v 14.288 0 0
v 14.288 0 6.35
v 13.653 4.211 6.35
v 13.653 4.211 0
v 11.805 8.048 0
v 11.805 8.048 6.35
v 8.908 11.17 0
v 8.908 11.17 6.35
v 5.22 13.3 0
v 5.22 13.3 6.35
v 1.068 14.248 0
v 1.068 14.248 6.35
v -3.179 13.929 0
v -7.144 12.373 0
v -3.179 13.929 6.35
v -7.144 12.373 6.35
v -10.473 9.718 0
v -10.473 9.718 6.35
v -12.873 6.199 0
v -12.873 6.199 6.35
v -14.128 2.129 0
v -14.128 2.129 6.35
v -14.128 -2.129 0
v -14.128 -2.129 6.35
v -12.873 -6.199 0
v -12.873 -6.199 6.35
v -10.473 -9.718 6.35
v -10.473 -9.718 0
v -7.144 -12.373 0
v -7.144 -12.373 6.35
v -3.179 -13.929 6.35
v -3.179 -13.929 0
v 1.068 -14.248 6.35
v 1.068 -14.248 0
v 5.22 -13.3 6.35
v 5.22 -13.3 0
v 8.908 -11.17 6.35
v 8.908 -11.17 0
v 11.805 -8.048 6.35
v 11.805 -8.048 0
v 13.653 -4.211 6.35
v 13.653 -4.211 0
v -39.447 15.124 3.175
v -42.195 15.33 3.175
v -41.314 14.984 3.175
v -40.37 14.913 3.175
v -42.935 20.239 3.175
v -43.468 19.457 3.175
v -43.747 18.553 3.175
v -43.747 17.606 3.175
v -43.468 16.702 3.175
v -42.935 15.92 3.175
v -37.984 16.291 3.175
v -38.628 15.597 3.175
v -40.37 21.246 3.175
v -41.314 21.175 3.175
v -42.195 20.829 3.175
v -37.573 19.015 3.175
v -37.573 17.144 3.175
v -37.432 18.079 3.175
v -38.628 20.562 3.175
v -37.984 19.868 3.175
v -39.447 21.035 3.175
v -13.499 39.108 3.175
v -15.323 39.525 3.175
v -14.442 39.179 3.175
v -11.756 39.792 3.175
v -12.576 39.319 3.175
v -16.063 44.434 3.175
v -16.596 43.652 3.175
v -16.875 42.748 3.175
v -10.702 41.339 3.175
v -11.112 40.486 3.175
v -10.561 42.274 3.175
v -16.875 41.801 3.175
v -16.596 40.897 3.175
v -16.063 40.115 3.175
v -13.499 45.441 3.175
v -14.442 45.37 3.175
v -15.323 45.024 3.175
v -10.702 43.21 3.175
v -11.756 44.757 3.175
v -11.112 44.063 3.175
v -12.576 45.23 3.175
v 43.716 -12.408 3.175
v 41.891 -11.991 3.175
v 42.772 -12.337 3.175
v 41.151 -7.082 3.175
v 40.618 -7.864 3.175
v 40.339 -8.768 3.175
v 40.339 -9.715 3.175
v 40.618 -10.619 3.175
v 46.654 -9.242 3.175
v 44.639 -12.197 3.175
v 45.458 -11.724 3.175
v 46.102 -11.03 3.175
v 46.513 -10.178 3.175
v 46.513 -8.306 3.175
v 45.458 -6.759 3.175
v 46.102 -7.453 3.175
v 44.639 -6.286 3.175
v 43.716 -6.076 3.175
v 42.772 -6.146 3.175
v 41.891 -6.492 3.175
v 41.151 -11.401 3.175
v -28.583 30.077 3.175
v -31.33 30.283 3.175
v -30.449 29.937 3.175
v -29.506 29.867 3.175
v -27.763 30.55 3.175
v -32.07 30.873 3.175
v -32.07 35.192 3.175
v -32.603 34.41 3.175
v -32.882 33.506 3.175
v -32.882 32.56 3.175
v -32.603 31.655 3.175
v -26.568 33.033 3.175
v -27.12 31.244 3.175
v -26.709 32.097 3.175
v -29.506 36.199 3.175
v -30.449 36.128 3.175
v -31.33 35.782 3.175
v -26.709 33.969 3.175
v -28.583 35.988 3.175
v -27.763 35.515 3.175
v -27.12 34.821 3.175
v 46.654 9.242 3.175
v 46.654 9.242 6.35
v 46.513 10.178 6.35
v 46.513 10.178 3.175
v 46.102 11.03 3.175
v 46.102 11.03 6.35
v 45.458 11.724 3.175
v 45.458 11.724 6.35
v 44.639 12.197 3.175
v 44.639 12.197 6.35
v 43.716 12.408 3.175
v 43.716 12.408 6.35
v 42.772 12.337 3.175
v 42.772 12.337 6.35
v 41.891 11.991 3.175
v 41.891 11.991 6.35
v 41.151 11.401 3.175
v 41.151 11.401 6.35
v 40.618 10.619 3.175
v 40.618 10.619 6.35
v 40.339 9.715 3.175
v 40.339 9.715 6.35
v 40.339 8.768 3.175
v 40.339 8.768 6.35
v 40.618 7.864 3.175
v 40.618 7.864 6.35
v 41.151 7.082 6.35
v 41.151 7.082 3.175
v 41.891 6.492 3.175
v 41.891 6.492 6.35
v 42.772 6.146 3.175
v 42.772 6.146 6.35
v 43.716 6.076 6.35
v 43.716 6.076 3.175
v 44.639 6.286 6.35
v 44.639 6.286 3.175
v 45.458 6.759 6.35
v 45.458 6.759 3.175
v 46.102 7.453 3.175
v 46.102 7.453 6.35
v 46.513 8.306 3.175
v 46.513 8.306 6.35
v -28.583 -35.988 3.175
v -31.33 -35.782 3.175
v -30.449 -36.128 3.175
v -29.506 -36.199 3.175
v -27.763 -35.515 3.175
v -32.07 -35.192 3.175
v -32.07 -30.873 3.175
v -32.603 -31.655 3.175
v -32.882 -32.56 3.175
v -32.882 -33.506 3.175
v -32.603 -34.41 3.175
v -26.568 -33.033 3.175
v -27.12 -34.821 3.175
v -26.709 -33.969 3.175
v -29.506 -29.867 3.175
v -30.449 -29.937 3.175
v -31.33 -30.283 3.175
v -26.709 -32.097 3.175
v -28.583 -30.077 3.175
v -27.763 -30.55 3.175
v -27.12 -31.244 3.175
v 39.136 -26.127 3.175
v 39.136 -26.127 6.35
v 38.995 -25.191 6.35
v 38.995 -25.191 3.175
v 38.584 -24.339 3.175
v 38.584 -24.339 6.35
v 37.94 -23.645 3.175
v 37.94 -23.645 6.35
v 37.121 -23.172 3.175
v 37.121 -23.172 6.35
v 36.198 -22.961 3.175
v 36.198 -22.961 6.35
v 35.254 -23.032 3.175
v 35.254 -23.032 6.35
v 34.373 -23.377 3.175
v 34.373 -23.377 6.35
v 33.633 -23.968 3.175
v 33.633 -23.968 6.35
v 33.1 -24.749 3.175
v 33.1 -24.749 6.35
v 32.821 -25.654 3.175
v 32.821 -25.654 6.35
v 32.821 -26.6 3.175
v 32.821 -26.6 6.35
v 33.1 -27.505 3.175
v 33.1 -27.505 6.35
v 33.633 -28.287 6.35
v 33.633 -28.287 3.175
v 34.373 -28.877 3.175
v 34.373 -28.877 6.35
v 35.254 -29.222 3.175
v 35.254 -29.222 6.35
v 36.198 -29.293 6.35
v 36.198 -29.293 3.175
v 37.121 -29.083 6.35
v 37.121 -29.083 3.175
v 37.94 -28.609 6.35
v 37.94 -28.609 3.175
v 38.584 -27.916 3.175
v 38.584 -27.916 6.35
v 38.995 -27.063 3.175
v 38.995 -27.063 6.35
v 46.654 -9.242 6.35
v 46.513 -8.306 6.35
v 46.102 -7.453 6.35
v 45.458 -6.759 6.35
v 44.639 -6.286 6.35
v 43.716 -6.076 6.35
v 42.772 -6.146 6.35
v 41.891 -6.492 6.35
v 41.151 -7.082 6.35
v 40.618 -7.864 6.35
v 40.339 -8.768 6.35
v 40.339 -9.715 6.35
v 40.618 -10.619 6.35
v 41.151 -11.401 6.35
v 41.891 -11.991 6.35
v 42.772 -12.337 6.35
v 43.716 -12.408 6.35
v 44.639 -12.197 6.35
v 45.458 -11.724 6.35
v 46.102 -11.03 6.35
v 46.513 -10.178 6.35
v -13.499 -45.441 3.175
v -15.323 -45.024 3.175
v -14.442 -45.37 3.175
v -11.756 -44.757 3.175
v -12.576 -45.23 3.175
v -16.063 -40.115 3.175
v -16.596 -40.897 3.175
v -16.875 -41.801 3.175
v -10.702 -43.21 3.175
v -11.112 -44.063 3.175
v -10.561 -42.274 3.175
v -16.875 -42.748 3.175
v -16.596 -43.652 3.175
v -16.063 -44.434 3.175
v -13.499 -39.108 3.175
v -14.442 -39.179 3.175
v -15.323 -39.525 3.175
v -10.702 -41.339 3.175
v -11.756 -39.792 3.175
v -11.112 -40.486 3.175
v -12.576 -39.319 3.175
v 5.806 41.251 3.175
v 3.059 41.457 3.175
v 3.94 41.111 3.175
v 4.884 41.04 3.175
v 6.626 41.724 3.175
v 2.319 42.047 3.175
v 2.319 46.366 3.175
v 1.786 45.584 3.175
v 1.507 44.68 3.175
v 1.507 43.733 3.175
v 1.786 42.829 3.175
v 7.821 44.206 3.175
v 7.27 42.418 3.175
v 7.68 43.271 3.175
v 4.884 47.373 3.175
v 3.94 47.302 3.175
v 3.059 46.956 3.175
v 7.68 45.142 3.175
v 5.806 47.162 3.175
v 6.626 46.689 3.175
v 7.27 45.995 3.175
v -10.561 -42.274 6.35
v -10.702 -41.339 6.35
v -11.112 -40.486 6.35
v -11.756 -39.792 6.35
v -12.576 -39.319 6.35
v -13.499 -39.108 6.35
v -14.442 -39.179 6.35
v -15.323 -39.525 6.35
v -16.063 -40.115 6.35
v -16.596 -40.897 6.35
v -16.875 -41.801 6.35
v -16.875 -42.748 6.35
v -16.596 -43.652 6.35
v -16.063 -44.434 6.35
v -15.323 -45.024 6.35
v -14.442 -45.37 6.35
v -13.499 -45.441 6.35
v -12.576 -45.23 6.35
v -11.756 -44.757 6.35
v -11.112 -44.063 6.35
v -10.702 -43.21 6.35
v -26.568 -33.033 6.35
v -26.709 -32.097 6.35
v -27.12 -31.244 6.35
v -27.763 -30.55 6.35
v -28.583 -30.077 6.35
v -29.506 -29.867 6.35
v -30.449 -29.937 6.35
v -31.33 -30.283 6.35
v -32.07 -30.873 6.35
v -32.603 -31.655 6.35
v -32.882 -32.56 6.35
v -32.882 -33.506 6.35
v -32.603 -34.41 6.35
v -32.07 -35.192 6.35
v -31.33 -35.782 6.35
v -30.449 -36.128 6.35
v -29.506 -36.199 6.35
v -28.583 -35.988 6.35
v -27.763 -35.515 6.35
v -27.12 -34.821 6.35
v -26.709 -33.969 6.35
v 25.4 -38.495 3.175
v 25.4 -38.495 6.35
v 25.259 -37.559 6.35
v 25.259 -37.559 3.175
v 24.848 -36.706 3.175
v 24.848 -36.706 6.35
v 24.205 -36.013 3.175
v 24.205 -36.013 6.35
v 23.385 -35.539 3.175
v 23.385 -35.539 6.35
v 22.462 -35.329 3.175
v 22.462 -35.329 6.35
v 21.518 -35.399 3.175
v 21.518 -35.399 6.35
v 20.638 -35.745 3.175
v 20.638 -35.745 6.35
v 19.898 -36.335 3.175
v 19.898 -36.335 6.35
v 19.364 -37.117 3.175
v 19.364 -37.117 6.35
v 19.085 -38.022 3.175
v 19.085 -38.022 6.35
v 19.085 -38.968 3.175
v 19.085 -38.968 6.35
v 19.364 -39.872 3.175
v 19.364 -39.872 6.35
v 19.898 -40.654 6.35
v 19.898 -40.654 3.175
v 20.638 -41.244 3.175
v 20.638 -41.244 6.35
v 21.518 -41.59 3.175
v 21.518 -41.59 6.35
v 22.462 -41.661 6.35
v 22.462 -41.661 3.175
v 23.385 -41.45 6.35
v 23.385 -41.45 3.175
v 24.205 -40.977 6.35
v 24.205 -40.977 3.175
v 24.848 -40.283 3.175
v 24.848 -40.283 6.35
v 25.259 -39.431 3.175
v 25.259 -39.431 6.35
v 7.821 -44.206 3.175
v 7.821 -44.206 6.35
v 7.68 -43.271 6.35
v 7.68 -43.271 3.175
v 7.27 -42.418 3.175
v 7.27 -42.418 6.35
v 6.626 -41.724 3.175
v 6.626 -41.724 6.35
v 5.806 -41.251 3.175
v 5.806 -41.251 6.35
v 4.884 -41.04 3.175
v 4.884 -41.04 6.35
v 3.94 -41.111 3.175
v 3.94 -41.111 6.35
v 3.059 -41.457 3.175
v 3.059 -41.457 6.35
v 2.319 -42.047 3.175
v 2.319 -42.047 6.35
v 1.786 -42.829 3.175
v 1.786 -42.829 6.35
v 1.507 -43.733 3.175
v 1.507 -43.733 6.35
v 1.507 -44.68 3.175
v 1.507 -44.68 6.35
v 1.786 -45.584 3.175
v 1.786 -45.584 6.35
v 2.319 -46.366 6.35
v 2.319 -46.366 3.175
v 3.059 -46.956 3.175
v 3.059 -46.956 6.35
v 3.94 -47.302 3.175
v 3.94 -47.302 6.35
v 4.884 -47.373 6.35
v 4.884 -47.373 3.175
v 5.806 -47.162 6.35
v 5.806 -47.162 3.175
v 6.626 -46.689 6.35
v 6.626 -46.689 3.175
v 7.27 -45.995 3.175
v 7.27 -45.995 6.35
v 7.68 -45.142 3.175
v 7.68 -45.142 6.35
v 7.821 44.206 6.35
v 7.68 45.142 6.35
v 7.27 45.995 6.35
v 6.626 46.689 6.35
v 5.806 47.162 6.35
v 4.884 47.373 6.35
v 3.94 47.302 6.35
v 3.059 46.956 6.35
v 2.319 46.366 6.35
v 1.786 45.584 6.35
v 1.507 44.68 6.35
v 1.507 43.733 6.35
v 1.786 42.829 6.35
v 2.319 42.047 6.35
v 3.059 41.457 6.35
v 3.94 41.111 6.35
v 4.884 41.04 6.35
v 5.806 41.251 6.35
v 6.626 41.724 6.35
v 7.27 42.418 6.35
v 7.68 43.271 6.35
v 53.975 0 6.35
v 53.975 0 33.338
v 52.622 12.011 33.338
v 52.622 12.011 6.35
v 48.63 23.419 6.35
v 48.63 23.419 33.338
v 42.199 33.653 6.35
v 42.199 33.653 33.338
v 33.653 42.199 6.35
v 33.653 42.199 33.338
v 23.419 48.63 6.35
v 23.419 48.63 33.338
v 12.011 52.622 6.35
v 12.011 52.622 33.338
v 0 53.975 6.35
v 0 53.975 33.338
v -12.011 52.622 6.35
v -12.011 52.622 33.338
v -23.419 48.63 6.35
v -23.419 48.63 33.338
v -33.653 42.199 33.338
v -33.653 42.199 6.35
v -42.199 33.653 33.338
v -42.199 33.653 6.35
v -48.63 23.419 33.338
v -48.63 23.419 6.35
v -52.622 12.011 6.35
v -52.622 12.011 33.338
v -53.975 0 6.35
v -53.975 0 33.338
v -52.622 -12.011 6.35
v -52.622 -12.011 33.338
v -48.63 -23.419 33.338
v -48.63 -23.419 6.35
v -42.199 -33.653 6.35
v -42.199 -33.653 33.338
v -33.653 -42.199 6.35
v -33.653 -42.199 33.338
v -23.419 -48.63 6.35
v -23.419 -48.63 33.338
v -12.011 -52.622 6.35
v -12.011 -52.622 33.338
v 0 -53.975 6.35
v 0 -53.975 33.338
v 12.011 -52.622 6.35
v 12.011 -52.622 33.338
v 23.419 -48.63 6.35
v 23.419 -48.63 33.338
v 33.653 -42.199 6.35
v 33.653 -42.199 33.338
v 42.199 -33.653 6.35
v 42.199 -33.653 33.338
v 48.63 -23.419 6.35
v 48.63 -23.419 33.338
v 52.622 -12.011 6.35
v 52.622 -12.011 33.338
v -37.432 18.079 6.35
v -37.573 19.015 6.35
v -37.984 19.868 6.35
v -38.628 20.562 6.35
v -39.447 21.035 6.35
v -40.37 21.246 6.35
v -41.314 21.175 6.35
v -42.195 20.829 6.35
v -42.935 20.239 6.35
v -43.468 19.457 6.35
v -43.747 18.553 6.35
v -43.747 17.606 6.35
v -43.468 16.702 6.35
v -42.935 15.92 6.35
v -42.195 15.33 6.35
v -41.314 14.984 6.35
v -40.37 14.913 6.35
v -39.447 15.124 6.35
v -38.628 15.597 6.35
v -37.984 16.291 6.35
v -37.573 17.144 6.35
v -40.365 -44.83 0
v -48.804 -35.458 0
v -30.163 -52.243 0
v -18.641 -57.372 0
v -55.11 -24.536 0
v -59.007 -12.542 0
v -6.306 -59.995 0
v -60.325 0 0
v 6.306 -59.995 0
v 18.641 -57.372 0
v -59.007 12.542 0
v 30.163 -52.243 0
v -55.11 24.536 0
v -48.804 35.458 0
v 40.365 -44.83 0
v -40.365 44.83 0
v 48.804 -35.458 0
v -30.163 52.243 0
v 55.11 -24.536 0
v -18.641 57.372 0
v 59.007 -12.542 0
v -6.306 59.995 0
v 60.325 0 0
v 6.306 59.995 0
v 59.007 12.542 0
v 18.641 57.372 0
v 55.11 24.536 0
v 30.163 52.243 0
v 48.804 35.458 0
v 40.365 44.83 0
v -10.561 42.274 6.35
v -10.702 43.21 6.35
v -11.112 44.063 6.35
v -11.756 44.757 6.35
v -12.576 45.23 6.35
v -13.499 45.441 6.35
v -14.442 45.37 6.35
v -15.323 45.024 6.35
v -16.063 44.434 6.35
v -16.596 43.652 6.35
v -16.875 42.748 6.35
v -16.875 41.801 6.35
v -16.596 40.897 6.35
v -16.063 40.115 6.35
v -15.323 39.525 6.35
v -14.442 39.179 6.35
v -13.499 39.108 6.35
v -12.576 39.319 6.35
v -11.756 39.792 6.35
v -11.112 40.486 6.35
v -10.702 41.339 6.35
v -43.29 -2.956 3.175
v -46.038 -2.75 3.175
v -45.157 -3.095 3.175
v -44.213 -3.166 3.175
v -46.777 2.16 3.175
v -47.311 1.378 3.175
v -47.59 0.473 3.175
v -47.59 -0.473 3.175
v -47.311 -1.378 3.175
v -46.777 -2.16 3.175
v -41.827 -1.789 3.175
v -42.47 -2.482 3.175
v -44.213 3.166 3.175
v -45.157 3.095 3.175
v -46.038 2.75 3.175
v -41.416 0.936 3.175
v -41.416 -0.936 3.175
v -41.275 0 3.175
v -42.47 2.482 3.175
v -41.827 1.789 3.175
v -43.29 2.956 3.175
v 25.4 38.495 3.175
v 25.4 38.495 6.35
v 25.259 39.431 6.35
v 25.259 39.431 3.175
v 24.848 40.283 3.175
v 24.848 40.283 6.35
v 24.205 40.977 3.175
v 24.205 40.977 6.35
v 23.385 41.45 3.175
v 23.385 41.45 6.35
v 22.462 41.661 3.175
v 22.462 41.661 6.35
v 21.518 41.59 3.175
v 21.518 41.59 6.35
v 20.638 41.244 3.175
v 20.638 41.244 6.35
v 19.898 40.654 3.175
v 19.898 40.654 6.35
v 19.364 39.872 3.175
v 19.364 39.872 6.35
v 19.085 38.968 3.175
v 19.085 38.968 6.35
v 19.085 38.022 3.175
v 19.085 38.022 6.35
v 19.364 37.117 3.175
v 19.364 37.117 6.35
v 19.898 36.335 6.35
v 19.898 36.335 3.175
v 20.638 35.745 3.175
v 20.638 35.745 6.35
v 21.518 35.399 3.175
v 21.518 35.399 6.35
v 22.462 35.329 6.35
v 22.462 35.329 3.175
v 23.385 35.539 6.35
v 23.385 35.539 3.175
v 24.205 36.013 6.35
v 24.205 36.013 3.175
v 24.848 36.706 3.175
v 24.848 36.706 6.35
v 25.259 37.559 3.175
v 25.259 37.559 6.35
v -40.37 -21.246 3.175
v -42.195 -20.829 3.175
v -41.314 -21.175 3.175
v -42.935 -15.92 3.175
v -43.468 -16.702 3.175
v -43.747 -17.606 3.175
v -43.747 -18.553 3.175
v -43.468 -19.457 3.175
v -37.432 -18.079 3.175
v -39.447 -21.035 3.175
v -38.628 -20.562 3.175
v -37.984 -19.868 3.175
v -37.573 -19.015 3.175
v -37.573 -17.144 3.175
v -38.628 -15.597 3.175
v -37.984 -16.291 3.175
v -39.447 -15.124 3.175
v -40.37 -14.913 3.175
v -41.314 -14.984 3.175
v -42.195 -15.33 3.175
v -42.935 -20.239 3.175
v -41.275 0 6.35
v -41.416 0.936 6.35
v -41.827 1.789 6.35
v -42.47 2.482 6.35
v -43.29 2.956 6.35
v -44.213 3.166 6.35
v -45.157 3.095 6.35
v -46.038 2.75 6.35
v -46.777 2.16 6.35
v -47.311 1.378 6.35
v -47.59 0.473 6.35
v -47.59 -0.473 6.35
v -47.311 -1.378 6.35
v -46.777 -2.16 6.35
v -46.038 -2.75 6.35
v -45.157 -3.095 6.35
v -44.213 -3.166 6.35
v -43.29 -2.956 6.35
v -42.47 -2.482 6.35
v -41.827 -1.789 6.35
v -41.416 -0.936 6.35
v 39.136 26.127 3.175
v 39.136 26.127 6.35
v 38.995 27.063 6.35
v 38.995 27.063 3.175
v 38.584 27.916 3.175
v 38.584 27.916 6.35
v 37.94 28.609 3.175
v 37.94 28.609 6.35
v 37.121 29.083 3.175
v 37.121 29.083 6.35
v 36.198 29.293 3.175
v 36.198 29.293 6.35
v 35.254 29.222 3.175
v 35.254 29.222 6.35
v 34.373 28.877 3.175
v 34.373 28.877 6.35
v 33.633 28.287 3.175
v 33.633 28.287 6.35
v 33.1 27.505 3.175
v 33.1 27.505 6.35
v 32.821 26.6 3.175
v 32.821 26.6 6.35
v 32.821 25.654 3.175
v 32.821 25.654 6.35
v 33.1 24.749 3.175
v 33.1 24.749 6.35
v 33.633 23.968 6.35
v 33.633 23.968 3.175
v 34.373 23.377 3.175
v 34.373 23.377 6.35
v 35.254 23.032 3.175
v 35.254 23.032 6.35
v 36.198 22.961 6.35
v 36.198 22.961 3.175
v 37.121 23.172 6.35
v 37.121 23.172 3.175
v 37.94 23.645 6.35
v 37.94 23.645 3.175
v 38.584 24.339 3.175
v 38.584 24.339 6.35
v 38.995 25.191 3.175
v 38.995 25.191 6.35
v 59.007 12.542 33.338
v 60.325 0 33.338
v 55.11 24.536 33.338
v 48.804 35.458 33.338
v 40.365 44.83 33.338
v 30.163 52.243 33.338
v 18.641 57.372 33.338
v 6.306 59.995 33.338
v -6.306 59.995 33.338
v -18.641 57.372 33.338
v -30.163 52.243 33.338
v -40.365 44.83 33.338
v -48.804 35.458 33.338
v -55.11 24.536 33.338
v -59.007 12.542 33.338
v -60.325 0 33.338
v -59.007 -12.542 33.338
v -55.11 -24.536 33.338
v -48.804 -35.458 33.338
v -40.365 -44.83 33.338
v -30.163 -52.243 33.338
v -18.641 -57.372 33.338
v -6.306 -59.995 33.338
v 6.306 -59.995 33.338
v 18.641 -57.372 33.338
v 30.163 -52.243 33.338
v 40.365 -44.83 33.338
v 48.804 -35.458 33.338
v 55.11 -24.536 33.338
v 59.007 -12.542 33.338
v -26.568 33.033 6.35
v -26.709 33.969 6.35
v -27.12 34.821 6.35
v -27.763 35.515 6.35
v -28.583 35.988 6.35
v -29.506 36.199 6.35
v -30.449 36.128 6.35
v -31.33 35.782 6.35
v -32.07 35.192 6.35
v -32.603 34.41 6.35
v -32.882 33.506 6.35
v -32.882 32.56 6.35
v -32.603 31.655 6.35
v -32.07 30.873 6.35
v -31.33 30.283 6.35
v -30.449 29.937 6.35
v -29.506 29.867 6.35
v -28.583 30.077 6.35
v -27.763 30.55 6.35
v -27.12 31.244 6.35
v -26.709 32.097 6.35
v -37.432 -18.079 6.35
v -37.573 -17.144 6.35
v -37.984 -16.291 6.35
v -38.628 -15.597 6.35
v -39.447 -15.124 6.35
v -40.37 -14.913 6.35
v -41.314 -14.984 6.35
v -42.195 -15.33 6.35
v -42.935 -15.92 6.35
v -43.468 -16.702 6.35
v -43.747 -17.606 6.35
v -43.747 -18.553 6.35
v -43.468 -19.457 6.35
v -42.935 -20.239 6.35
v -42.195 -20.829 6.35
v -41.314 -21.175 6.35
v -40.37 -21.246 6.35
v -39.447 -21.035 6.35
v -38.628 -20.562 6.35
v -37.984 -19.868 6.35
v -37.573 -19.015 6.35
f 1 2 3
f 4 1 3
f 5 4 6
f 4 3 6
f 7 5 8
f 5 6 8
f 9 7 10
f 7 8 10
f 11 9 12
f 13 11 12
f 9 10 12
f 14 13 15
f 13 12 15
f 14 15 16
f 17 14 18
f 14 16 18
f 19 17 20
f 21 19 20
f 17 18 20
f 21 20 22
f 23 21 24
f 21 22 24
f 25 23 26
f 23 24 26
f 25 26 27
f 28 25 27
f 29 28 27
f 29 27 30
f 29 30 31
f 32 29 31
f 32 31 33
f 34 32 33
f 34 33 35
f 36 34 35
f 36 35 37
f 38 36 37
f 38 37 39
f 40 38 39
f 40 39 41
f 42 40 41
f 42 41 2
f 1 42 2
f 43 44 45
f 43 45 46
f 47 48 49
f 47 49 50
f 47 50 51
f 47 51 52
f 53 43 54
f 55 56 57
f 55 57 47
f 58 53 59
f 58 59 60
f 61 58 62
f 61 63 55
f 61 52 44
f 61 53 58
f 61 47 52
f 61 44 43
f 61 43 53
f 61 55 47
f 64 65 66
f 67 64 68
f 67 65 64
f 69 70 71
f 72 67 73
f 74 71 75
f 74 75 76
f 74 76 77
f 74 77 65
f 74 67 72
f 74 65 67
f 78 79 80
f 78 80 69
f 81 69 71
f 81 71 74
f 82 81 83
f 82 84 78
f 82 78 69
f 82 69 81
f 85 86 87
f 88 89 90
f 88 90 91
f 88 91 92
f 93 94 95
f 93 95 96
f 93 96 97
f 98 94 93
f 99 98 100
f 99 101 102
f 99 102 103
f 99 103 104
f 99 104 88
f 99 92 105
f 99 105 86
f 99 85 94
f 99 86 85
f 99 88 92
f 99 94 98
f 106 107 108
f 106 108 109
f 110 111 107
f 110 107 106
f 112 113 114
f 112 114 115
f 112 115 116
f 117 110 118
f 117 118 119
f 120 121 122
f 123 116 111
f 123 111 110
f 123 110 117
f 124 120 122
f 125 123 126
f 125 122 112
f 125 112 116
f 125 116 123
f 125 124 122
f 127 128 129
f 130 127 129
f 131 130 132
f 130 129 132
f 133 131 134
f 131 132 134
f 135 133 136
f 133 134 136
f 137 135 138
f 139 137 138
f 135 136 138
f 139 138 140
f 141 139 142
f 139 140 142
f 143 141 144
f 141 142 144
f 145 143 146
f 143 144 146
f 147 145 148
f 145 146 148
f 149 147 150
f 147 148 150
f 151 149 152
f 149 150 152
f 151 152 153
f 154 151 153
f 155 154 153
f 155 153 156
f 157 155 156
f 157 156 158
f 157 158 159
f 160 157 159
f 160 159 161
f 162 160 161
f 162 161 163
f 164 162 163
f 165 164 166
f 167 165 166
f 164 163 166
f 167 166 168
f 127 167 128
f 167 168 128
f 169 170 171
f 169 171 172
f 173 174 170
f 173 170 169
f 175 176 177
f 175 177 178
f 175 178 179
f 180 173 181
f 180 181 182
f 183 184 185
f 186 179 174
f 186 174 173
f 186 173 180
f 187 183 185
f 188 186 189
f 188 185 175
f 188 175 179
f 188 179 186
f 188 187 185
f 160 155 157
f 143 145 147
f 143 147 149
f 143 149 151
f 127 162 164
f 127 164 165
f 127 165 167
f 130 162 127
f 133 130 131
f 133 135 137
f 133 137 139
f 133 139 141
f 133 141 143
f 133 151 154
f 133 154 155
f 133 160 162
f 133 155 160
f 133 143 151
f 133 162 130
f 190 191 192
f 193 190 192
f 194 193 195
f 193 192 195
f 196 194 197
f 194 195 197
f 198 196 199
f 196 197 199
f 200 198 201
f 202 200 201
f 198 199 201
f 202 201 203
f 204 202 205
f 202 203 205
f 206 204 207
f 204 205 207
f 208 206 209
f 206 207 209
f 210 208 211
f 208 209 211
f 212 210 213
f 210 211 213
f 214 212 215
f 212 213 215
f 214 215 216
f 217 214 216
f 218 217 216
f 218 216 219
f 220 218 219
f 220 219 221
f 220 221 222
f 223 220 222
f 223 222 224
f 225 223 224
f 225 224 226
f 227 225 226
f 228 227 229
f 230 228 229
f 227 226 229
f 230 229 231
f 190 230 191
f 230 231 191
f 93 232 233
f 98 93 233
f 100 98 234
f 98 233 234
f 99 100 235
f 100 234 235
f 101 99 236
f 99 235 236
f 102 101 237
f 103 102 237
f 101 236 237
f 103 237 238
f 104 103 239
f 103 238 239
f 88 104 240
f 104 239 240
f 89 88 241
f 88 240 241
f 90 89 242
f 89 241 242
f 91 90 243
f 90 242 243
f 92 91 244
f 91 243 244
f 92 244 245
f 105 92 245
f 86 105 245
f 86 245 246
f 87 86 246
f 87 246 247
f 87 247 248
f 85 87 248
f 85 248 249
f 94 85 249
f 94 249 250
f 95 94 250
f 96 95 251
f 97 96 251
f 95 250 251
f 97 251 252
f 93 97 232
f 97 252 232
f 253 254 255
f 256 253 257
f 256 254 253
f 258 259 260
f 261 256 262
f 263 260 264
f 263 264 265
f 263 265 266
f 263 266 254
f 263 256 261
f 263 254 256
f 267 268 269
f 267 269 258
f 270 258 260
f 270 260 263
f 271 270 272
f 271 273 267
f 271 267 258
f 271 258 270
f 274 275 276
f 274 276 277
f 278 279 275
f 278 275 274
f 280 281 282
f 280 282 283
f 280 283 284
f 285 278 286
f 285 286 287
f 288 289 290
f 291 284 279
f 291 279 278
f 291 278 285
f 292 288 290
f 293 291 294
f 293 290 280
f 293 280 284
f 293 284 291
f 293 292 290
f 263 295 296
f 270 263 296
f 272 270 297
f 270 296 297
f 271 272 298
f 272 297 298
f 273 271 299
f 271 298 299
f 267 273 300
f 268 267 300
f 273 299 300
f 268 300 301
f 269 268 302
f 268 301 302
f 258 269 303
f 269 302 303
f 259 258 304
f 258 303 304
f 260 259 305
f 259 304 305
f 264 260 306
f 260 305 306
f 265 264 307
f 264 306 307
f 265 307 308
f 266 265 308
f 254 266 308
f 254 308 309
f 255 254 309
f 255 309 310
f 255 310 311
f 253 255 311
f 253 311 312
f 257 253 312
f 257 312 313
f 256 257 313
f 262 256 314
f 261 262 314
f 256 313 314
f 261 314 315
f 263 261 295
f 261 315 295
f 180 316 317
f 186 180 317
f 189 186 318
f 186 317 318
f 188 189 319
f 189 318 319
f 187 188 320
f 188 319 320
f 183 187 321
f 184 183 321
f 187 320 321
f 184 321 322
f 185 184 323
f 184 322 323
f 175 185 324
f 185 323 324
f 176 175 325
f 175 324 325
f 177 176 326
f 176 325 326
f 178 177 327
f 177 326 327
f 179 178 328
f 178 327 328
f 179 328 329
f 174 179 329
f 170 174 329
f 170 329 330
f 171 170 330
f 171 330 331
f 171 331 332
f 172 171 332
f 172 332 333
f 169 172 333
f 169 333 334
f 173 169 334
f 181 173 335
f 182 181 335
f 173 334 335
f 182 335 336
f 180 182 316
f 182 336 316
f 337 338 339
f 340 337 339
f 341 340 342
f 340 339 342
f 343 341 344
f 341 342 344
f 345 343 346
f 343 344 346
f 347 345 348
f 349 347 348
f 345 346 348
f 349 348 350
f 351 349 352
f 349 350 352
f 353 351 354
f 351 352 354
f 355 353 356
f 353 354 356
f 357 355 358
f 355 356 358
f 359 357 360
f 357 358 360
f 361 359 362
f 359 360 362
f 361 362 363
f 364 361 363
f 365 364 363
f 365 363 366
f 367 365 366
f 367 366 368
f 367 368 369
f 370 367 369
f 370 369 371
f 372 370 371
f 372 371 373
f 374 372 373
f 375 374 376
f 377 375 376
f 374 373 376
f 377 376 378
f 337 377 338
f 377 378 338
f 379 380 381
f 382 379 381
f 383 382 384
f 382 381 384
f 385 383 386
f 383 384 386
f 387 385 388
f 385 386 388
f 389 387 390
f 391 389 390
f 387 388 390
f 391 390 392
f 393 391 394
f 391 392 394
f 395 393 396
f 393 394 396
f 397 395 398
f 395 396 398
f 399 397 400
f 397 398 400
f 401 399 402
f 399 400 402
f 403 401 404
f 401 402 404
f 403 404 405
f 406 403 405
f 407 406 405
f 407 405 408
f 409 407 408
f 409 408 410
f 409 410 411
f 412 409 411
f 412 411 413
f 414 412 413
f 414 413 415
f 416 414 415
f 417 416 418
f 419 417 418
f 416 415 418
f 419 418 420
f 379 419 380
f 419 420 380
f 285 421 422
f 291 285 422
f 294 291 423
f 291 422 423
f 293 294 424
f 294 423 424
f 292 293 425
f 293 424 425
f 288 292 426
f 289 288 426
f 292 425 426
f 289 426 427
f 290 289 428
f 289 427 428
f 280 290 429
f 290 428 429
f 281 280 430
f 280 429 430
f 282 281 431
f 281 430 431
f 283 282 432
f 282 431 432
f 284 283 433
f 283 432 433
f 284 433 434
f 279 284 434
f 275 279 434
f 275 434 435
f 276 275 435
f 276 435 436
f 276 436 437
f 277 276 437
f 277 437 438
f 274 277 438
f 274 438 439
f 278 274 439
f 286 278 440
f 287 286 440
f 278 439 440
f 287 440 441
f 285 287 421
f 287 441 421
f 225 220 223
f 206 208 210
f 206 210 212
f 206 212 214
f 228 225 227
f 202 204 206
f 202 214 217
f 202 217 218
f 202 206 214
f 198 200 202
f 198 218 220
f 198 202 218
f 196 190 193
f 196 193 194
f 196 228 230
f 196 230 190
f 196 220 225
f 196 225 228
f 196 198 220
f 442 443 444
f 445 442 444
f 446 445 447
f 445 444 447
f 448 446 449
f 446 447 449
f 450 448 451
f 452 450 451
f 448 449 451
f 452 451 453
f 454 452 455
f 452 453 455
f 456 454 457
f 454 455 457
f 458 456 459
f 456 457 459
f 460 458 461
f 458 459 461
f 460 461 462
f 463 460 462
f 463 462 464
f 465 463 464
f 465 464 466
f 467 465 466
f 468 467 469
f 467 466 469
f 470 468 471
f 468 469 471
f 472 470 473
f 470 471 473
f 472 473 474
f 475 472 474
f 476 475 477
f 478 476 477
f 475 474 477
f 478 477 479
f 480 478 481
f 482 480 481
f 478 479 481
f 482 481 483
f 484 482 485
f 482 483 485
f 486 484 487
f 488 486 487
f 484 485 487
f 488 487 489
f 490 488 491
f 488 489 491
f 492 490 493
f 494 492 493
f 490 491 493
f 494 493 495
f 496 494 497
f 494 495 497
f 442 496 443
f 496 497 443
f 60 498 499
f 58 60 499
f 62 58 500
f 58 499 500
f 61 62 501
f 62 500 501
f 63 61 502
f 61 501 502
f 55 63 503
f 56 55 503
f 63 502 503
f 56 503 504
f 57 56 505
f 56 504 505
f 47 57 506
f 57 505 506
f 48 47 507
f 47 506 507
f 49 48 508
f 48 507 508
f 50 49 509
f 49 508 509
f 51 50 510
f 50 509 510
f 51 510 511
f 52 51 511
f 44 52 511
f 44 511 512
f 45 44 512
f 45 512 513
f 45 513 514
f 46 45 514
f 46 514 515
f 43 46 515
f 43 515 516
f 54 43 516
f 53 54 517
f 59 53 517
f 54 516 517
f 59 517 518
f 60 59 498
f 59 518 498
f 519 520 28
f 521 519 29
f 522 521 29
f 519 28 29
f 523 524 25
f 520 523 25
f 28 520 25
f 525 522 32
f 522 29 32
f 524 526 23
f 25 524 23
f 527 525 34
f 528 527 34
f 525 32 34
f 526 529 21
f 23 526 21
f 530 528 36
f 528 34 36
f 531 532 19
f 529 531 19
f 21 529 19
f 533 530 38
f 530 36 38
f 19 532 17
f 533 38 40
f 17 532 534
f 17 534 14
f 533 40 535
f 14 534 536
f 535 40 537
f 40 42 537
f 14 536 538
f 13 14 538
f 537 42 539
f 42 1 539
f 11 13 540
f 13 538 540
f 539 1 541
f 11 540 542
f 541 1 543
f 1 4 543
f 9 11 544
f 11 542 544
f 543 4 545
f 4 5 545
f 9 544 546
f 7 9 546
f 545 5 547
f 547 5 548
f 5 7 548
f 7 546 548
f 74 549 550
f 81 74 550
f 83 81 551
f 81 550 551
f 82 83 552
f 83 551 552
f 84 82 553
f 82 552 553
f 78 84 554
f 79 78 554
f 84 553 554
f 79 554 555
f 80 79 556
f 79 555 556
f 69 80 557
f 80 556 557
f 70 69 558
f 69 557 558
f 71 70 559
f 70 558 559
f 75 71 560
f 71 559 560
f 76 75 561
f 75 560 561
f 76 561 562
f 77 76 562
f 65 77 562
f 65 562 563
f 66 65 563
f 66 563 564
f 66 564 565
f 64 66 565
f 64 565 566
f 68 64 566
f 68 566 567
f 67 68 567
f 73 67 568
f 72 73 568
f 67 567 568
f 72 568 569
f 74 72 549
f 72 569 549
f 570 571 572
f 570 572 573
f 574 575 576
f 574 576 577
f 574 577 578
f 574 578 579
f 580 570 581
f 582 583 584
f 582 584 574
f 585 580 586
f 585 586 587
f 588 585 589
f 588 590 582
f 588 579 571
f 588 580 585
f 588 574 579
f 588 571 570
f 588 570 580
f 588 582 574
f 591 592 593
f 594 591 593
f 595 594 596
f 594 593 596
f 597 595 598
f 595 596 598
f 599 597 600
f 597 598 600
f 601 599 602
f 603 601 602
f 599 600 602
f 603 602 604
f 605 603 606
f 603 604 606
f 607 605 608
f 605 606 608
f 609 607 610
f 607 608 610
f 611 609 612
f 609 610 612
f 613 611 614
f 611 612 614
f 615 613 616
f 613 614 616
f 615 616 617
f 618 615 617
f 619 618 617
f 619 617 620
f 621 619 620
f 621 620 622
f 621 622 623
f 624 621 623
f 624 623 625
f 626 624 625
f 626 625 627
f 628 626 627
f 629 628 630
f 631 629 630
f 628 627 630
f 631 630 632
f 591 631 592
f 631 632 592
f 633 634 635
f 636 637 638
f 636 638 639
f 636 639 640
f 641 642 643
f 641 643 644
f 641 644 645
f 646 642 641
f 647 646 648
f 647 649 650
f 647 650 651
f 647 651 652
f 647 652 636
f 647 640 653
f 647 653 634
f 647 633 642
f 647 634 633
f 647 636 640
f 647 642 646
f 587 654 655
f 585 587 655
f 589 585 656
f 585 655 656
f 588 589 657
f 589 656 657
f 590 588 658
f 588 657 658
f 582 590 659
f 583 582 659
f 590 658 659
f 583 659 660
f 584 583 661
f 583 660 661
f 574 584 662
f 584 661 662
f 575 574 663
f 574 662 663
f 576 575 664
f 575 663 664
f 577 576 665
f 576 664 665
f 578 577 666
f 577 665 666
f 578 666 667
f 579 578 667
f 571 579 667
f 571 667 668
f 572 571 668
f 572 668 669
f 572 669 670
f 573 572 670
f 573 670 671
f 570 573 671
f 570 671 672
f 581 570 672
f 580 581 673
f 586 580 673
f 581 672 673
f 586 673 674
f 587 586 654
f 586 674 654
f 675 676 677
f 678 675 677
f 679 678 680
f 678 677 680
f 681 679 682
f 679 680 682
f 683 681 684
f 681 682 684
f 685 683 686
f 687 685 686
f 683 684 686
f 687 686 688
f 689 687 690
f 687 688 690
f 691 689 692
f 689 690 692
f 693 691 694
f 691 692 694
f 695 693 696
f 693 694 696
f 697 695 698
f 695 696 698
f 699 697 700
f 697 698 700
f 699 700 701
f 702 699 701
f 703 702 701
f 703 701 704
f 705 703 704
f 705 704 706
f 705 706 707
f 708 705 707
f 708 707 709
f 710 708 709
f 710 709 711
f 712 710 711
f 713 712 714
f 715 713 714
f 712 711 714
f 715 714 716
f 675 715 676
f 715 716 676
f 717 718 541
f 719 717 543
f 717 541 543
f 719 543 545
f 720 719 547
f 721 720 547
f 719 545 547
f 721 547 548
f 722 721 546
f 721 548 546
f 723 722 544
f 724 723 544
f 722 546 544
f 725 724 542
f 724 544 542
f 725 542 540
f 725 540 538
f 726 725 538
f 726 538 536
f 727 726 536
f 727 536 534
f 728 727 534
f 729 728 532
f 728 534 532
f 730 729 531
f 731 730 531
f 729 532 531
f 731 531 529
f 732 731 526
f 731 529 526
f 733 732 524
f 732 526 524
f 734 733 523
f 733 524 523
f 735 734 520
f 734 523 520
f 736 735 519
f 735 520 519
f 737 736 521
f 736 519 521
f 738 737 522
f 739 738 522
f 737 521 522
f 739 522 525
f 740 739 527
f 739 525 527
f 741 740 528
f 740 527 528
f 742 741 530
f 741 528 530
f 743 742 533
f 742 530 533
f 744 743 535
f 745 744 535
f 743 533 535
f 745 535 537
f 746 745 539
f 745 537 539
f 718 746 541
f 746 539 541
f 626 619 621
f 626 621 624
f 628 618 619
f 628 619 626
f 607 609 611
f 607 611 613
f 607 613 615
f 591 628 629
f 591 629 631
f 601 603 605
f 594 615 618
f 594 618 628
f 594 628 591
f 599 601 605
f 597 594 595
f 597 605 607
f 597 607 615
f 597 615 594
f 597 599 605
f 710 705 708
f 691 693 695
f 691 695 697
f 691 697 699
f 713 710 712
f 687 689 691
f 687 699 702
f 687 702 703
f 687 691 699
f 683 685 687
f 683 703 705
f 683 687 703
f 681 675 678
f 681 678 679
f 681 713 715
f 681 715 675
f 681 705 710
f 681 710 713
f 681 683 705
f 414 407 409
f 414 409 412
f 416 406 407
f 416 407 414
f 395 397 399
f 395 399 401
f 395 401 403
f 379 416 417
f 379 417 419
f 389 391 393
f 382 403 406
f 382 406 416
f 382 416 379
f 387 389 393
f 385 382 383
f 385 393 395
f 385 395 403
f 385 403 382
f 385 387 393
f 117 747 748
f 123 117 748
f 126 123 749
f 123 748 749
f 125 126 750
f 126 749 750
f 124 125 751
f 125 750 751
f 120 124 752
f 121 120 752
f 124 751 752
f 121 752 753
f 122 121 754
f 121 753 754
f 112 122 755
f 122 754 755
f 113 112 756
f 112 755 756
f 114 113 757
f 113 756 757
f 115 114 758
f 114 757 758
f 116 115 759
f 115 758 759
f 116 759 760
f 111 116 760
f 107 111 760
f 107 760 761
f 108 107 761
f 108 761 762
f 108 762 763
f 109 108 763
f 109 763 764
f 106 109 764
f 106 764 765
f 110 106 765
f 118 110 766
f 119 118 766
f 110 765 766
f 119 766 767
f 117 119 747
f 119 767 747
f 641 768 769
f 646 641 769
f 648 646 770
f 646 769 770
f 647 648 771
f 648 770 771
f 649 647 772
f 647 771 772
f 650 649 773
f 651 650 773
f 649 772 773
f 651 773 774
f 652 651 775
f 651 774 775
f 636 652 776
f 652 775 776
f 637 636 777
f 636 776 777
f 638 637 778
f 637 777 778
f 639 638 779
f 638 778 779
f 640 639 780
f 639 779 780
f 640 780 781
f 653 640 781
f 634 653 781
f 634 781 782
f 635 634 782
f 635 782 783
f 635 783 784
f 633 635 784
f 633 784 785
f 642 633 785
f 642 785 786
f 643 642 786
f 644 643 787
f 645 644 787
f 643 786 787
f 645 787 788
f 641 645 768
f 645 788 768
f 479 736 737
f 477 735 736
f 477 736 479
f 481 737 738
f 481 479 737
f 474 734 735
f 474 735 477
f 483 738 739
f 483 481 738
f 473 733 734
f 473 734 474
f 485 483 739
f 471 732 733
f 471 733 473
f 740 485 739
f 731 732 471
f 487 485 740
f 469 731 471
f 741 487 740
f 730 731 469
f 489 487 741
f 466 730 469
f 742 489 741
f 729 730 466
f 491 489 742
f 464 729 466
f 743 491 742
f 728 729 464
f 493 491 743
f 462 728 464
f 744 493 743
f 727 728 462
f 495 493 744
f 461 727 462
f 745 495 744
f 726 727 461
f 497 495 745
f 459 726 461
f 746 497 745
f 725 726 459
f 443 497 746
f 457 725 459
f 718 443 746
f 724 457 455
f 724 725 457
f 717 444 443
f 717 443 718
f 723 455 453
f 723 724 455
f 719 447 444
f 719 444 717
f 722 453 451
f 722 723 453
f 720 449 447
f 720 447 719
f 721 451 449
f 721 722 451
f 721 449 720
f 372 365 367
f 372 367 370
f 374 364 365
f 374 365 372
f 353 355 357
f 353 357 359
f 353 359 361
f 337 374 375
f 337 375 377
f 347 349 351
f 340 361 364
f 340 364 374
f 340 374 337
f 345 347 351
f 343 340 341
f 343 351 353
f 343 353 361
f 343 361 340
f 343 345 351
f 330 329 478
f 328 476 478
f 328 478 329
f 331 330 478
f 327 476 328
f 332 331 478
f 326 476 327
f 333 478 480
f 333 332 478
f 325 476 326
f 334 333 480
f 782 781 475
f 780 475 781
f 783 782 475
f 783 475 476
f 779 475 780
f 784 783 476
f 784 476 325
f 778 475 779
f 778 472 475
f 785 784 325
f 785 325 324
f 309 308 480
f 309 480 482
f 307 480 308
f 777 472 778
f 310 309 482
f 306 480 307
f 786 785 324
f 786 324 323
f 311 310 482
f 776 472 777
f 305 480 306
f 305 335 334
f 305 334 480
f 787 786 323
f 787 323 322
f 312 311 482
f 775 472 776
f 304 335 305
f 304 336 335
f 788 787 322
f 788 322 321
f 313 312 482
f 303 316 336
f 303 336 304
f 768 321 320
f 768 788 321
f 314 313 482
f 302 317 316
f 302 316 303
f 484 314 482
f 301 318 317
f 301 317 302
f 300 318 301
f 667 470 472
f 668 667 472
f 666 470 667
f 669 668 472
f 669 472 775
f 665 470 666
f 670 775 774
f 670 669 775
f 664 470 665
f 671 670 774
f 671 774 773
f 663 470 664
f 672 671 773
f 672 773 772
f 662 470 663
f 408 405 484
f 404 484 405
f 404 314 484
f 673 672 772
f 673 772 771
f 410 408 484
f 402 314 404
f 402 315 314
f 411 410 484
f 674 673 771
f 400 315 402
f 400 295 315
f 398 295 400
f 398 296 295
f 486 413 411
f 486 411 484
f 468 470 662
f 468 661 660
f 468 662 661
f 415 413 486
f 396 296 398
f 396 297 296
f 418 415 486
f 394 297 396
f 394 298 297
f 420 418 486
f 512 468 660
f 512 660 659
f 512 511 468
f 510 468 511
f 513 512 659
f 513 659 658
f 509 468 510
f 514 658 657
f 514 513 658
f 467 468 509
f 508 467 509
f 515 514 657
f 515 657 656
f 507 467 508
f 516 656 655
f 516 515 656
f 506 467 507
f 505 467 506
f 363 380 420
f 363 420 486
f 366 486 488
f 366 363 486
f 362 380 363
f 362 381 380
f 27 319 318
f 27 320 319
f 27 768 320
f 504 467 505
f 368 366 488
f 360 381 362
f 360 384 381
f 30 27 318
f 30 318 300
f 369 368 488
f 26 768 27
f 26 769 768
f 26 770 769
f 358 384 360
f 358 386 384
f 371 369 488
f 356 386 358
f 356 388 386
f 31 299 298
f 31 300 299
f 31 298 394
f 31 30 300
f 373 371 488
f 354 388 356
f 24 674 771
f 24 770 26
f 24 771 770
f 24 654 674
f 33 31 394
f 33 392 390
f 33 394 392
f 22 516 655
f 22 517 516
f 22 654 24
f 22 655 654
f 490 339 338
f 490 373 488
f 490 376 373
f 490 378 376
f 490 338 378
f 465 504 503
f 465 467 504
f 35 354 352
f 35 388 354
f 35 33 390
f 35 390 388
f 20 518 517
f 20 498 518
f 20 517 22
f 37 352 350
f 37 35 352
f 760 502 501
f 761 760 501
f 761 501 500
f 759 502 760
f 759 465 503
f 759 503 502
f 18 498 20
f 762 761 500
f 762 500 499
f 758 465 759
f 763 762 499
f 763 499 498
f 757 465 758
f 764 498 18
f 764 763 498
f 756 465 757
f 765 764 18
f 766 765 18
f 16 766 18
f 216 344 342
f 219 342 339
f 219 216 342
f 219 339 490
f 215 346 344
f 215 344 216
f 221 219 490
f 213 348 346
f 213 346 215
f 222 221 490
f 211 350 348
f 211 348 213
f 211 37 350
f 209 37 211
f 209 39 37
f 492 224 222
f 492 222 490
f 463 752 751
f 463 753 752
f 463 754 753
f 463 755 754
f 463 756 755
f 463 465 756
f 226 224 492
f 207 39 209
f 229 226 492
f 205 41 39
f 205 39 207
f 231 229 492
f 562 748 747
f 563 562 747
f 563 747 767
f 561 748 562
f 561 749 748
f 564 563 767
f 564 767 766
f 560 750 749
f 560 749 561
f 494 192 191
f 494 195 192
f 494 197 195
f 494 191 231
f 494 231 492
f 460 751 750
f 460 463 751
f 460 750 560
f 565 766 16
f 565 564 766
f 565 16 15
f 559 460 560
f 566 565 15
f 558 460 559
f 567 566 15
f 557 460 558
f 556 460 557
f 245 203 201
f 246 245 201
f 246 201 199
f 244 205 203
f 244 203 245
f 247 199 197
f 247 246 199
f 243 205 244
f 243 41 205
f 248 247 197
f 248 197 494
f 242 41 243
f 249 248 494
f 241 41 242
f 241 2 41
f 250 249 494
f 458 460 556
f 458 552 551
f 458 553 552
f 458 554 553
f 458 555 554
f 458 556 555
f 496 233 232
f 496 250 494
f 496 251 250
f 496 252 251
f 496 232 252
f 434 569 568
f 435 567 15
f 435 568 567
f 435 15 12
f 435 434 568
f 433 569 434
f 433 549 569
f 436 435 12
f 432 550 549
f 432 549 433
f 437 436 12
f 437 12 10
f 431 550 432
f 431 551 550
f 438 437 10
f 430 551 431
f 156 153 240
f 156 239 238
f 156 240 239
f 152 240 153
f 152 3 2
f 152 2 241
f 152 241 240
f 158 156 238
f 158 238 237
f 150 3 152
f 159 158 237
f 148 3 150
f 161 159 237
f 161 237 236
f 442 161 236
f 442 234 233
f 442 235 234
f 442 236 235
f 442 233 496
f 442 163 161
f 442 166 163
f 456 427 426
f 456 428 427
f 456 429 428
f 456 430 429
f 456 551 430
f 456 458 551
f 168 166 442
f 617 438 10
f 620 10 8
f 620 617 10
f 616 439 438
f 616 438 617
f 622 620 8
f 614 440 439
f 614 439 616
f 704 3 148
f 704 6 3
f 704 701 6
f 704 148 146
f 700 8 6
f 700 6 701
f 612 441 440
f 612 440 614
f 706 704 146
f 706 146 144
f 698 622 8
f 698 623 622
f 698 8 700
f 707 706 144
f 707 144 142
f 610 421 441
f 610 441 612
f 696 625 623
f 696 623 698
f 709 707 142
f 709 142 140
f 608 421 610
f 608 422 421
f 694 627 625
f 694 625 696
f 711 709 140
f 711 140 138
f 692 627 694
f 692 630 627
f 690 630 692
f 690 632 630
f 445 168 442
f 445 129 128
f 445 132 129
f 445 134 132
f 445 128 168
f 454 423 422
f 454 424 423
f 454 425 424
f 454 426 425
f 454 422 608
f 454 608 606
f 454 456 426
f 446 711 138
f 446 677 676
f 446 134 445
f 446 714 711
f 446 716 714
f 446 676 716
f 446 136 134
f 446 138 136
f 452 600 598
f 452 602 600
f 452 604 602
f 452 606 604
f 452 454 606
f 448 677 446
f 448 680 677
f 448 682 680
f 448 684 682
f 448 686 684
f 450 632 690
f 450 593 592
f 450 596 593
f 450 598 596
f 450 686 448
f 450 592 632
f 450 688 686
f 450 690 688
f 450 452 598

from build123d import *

# Parameters (mm, degrees)
SKETCH1_R           = 60.325
BOSS_EXTRUDE1_DEPTH = 33.3375
SKETCH2_R           = 53.975
CUT_EXTRUDE1_DEPTH  = 26.9875
SKETCH3_R           = 3.175
CUT_EXTRUDE2_DEPTH  = 3.175
SKETCH4_R           = 14.2875
CUT_EXTRUDE3_DEPTH  = 90.479251261


with BuildPart() as part:
    # Sketch1 → Boss-Extrude1 (new body)
    with BuildSketch(Plane.XY):
        Circle(SKETCH1_R)
    extrude(amount=BOSS_EXTRUDE1_DEPTH)

    # Sketch2 → Cut-Extrude1 (cut)
    with BuildSketch(Plane.XY.offset(33.3375)):
        Circle(SKETCH2_R)
    extrude(amount=-CUT_EXTRUDE1_DEPTH, mode=Mode.SUBTRACT)

    # Sketch3 → Cut-Extrude2 (cut)
    with BuildSketch(Plane.XY.offset(6.35)):
        with Locations((-44.45, 0)):
            Circle(SKETCH3_R)
        with Locations((-40.607095592, 18.079443785)):
            Circle(SKETCH3_R)
        with Locations((-29.742855453, 33.032787492)):
            Circle(SKETCH3_R)
        with Locations((-13.7358054, 42.274462149)):
            Circle(SKETCH3_R)
        with Locations((4.646290192, 44.206498249)):
            Circle(SKETCH3_R)
        with Locations((22.225, 38.494829198)):
            Circle(SKETCH3_R)
        with Locations((35.9608054, 26.127054464)):
            Circle(SKETCH3_R)
        with Locations((43.478660853, 9.241674657)):
            Circle(SKETCH3_R)
        with Locations((43.478660853, -9.241674657)):
            Circle(SKETCH3_R)
        with Locations((35.9608054, -26.127054464)):
            Circle(SKETCH3_R)
        with Locations((22.225, -38.494829198)):
            Circle(SKETCH3_R)
        with Locations((4.646290192, -44.206498249)):
            Circle(SKETCH3_R)
        with Locations((-13.7358054, -42.274462149)):
            Circle(SKETCH3_R)
        with Locations((-29.742855453, -33.032787492)):
            Circle(SKETCH3_R)
        with Locations((-40.607095592, -18.079443785)):
            Circle(SKETCH3_R)
    extrude(amount=-CUT_EXTRUDE2_DEPTH, mode=Mode.SUBTRACT)

    # Sketch4 → Cut-Extrude3 (cut, through all)
    with BuildSketch(Plane.XY.offset(6.35)):
        Circle(SKETCH4_R)
    extrude(amount=-CUT_EXTRUDE3_DEPTH, mode=Mode.SUBTRACT)


solid = part.part
